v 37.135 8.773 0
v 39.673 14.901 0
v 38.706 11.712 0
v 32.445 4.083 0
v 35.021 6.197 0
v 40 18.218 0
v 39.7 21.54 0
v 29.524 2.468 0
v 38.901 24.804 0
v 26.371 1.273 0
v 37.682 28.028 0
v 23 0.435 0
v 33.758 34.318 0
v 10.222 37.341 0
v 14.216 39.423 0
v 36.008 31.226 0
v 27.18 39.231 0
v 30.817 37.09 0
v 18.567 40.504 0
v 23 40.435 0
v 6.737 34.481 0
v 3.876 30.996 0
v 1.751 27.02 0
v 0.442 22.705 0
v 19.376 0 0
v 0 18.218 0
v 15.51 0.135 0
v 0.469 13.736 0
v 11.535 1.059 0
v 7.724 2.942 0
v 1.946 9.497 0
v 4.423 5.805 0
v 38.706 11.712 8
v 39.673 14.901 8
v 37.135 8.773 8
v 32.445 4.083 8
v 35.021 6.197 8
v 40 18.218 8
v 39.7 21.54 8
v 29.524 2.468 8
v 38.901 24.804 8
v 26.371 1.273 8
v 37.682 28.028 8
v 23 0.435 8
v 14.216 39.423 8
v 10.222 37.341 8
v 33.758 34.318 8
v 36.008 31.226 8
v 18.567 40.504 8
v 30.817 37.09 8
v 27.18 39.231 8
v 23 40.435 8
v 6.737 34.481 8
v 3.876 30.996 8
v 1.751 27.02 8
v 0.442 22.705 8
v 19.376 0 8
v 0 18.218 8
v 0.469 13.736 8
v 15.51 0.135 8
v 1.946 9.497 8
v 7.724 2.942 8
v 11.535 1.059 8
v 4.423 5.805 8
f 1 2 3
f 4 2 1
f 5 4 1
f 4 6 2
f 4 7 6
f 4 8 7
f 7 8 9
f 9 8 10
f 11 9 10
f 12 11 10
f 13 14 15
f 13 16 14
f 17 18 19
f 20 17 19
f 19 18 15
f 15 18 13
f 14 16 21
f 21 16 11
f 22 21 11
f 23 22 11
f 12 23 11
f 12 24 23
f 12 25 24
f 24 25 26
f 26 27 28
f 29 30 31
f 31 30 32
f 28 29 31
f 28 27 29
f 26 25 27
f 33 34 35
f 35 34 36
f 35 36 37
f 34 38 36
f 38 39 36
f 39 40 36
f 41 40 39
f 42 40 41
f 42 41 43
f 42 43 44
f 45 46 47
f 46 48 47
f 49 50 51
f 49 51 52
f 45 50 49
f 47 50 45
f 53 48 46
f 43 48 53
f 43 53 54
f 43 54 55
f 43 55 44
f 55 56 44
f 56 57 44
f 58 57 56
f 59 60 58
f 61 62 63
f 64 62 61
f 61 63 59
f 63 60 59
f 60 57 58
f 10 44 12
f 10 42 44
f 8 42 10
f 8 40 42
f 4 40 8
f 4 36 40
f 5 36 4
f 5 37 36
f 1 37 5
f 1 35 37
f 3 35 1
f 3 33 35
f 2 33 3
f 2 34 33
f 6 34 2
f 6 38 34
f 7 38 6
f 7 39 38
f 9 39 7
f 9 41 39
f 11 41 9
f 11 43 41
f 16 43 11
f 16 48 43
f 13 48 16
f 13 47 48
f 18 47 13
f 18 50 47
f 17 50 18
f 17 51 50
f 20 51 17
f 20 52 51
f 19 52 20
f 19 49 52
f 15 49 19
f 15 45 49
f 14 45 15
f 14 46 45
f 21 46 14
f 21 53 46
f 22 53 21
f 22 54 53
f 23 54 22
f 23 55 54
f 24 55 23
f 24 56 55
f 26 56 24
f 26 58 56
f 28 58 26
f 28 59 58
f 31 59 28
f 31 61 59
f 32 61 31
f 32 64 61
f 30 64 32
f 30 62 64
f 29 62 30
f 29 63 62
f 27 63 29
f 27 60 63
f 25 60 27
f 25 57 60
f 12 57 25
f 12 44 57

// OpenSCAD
$fn = 32;

// ----------------------------------------------------------------------
// Cam disc: base radius 17.0 mm, lift 6.0 mm, 32 profile points
// ----------------------------------------------------------------------

// --- parameters (mm) ---
profile_height = 8;       // extrusion height
profile_points = 32;      // points of the closed outline

profile = [[40, 18.218], [39.7, 21.54], [38.901, 24.804], [37.682, 28.028], [36.008, 31.226], [33.758, 34.318], [30.817, 37.09], [27.18, 39.231], [23, 40.435], [18.567, 40.504], [14.216, 39.423], [10.222, 37.341], [6.737, 34.481], [3.876, 30.996], [1.751, 27.02], [0.442, 22.705], [0, 18.218], [0.469, 13.736], [1.946, 9.497], [4.423, 5.805], [7.724, 2.942], [11.535, 1.059], [15.51, 0.135], [19.376, 0], [23, 0.435], [26.371, 1.273], [29.524, 2.468], [32.445, 4.083], [35.021, 6.197], [37.135, 8.773], [38.706, 11.712], [39.673, 14.901]];  // single closed polygon, 32 points, counter clockwise

// --- the one profile operation ---
linear_extrude(height = profile_height) polygon(points = profile);
